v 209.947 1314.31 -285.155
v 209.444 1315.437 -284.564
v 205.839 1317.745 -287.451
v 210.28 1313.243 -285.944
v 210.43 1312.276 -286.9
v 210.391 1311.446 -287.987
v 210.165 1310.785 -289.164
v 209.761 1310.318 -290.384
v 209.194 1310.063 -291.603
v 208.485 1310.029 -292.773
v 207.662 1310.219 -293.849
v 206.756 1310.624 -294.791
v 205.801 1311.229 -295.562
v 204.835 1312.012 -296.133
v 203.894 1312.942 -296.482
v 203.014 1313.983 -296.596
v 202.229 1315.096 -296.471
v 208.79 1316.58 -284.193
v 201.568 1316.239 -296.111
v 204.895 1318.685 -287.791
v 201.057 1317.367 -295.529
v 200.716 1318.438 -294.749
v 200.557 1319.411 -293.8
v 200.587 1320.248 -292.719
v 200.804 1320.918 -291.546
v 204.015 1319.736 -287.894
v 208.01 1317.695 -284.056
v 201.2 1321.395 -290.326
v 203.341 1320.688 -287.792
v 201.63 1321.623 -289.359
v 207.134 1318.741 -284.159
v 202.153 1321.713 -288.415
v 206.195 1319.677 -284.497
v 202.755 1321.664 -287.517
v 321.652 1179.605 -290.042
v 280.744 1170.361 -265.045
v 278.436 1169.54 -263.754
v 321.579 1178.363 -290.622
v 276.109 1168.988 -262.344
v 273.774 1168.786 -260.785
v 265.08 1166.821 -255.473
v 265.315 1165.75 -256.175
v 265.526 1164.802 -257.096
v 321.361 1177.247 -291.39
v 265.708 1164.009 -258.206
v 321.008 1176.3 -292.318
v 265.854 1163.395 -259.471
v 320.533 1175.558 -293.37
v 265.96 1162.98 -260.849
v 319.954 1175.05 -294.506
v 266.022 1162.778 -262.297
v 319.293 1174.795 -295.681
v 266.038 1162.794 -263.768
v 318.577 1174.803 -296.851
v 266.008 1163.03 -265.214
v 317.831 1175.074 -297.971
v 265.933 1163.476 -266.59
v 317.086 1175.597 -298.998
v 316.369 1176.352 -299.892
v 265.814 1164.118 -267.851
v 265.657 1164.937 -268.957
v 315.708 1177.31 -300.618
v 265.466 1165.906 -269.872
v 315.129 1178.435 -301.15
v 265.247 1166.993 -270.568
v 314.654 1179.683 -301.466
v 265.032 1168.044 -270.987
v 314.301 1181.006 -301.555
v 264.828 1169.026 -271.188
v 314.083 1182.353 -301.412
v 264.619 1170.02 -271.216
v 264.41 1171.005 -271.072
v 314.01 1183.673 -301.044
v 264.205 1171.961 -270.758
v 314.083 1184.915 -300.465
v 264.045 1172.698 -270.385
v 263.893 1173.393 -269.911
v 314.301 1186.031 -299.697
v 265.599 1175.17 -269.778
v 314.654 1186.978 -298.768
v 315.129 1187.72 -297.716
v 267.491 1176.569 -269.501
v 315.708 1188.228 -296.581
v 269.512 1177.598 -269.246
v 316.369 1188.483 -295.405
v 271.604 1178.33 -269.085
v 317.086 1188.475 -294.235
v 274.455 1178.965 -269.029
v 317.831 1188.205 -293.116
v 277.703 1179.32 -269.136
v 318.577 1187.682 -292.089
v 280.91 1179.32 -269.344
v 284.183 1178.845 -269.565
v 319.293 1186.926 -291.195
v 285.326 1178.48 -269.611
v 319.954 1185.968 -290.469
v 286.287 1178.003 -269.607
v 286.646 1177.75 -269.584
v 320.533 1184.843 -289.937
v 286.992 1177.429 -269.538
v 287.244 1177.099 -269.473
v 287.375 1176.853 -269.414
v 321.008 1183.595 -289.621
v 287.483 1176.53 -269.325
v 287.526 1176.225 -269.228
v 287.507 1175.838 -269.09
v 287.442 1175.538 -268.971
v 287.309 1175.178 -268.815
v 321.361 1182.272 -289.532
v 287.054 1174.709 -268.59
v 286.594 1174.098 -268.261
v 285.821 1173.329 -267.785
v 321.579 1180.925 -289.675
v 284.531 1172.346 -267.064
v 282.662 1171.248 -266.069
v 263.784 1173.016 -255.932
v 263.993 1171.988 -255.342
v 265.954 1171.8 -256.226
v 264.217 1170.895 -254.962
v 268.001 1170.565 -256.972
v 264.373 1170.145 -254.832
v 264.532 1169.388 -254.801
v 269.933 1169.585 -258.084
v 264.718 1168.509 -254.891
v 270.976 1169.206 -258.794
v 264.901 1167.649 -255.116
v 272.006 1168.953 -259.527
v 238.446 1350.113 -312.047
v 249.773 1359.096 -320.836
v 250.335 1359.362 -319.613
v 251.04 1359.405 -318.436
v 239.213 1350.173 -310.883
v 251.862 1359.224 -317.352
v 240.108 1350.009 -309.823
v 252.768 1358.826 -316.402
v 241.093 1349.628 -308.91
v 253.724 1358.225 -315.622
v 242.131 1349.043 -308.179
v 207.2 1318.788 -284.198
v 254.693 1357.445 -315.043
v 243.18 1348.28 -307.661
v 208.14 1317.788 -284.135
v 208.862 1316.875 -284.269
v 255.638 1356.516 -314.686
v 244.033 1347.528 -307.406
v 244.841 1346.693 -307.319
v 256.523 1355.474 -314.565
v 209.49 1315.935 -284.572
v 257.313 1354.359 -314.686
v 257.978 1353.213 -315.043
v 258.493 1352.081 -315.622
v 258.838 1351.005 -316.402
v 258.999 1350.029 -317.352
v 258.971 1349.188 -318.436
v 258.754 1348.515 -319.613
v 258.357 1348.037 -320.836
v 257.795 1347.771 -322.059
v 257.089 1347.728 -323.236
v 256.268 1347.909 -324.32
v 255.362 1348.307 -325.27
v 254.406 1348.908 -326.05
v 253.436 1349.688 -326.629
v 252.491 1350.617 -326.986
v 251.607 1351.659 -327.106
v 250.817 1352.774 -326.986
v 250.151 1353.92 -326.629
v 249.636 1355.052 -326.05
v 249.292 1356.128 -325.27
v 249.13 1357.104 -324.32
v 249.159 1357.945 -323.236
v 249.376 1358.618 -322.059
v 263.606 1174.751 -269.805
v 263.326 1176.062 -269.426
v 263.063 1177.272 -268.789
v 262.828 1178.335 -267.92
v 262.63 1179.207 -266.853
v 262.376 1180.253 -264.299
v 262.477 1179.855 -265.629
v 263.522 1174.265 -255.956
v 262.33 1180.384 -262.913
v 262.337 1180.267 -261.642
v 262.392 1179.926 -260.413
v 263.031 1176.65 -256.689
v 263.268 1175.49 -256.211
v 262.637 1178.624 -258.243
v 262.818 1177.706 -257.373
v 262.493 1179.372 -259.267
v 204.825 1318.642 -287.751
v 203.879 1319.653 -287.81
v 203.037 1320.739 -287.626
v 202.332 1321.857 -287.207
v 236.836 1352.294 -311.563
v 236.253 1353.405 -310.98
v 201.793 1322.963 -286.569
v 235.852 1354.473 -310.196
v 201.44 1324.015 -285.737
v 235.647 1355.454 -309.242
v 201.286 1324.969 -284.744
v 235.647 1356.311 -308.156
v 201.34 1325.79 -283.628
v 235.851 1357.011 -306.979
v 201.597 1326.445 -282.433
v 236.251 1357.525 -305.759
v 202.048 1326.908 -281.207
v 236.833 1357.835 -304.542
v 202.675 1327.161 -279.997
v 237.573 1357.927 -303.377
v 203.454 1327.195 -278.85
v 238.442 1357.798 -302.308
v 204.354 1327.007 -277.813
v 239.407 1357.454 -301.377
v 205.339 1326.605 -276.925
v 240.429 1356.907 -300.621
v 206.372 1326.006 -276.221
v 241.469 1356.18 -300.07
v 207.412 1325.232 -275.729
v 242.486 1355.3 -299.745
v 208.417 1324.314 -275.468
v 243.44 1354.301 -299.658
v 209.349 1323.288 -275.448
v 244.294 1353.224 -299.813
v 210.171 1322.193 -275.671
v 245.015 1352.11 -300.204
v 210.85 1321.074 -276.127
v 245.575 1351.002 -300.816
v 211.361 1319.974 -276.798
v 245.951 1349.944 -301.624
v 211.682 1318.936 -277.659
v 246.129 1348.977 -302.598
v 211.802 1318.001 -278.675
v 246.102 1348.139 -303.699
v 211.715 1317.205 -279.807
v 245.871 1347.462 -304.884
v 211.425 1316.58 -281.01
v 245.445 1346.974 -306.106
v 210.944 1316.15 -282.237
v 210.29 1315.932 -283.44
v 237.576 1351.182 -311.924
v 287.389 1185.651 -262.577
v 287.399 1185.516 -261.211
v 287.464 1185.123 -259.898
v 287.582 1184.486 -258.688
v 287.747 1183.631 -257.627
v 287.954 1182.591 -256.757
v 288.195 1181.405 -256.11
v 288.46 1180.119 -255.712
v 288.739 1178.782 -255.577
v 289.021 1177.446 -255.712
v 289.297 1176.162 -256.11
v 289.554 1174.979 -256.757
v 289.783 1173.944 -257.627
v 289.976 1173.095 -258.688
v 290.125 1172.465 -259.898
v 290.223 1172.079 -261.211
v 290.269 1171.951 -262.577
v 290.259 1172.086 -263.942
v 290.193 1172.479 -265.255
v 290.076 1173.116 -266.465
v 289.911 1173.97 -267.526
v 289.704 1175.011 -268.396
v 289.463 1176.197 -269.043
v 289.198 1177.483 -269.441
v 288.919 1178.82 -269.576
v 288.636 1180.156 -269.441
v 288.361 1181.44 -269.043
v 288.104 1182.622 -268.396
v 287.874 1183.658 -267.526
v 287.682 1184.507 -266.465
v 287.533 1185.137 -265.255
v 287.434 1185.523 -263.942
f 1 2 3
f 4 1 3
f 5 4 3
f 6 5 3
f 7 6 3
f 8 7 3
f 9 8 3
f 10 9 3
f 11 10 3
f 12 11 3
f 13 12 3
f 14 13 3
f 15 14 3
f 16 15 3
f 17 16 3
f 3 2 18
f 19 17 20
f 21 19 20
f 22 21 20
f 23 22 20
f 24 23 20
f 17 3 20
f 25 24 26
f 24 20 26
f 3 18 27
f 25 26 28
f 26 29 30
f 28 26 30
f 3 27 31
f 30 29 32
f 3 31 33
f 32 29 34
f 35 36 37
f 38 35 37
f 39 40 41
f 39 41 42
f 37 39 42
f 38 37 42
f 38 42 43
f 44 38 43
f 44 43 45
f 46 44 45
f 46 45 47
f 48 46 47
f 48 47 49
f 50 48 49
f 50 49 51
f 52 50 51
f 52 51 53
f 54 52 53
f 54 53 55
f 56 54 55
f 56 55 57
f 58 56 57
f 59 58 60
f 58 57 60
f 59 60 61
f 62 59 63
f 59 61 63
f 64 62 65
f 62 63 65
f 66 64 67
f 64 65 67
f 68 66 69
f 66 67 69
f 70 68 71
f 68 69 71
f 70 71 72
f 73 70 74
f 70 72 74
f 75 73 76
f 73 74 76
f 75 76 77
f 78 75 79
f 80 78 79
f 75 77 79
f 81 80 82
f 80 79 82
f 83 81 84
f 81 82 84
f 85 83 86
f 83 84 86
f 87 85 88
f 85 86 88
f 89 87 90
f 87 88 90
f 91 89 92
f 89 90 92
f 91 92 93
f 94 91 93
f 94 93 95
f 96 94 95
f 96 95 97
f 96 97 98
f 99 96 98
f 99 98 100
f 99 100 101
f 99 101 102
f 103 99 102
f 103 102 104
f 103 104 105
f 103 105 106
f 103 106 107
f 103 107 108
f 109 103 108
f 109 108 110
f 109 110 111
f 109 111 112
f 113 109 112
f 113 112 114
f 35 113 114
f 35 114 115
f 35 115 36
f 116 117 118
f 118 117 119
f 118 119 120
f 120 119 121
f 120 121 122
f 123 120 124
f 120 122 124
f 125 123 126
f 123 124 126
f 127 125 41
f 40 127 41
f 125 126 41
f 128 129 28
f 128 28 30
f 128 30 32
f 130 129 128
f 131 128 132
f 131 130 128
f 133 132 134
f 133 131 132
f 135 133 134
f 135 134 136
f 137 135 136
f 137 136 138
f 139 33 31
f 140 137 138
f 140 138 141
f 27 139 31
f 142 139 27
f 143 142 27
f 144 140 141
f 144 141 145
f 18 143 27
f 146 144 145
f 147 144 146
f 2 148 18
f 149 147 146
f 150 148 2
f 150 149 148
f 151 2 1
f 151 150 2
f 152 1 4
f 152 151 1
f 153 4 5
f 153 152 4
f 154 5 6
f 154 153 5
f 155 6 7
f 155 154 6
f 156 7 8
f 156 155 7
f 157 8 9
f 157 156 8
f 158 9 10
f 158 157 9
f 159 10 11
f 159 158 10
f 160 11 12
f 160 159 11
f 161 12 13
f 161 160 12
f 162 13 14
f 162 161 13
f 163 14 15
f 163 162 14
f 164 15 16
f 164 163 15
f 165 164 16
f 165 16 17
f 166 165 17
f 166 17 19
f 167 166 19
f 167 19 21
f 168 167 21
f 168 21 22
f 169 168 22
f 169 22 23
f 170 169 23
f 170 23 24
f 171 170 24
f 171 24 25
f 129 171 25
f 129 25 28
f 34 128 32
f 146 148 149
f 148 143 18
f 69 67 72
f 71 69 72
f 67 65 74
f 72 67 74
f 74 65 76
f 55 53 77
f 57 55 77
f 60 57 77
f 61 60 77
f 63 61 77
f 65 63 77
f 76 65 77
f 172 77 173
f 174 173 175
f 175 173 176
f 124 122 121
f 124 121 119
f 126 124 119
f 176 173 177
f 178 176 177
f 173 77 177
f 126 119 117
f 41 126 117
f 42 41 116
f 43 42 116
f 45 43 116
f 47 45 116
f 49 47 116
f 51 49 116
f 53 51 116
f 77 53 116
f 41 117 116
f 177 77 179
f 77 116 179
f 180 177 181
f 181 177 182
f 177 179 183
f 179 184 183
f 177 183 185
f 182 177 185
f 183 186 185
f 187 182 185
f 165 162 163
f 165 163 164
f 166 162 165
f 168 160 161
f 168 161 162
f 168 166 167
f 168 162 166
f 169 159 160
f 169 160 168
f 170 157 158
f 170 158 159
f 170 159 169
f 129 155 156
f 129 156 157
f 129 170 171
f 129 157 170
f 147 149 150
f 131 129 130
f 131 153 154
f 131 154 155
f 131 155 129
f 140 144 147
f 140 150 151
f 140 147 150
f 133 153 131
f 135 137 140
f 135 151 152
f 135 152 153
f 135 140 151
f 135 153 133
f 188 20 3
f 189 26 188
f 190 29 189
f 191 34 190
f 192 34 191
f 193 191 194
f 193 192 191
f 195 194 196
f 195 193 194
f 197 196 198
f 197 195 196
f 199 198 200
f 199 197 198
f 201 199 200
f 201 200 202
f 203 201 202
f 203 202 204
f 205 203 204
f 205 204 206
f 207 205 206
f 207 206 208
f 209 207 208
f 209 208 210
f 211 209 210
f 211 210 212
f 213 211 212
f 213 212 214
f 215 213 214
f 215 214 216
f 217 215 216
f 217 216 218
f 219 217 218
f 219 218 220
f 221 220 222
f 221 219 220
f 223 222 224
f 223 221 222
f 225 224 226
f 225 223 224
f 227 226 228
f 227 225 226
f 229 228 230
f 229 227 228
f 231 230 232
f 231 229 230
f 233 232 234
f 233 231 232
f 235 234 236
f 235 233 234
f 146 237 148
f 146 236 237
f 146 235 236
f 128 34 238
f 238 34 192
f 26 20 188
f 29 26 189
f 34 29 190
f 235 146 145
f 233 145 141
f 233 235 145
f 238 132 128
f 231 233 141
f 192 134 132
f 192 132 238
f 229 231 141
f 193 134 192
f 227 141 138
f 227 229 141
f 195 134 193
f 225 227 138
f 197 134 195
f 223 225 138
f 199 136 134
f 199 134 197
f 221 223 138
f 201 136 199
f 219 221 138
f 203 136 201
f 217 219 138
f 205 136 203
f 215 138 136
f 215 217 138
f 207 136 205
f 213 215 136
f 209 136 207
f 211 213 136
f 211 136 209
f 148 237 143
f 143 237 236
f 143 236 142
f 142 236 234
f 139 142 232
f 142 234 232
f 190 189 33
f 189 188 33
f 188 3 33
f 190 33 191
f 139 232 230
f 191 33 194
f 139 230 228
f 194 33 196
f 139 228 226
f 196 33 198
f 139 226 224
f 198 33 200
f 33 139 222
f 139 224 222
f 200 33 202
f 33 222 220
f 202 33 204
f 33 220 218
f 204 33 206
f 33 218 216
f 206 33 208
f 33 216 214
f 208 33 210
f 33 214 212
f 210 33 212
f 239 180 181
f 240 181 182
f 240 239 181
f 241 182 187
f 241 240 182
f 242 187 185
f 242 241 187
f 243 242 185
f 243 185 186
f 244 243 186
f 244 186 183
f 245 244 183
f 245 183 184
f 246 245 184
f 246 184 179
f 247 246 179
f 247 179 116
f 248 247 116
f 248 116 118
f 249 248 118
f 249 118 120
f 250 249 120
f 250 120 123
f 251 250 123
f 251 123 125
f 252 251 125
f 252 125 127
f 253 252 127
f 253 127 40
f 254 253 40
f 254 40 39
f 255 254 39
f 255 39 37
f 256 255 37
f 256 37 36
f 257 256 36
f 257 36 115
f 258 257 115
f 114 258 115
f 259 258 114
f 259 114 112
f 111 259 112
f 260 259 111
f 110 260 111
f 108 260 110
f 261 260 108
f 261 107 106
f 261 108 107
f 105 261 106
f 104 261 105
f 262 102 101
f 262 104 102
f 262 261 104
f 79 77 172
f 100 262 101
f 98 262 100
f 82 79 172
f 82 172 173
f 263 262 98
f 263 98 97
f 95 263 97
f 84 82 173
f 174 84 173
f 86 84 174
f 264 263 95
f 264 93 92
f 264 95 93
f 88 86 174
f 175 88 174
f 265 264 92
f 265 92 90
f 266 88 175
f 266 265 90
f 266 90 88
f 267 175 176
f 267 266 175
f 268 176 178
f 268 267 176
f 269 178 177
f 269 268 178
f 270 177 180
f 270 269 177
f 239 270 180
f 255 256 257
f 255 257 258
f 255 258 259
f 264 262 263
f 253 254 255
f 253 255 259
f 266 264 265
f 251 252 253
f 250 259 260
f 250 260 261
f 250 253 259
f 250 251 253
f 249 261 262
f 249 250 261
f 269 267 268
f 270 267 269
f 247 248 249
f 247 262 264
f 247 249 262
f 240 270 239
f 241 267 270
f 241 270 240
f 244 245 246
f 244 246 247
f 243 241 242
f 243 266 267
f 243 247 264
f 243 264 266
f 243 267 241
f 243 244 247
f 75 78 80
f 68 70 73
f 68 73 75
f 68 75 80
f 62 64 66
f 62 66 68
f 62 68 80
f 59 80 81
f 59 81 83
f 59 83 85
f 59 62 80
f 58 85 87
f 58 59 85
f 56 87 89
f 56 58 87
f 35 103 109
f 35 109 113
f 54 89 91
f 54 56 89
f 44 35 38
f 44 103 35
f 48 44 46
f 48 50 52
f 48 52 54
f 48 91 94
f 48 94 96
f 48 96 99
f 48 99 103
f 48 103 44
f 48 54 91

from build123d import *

# Parameters (mm, degrees)
SUSP_RR_ROCKER_BRACKET_A_PROFILE_R   = 7
SUSP_RR_ROCKER_BRACKET_B_START       = 582.103316114
SUSP_RR_ROCKER_BRACKET_B_OUTLINE_R   = 7
SUSP_RR_ROCKER_BRACKET_B_DEPTH       = 59.237735171
SUSP_RR_ROCKER_BRACKET_B_START_2     = 573.503727818
SUSP_RR_ROCKER_BRACKET_B_2_OUTLINE_R = 7
SUSP_RR_ROCKER_BRACKET_B_2_DEPTH     = 8.599588296
SUSP_RR_ROCKER_BRACKET_B_START_3     = 488
SUSP_RR_ROCKER_BRACKET_B_3_OUTLINE_W = 17
SUSP_RR_ROCKER_BRACKET_B_3_OUTLINE_H = 18
SUSP_RR_ROCKER_BRACKET_B_3_DEPTH     = 8.001614425
SUSP_RR_COILOVER_BRACKET_A_PROFILE_R = 7
SUSP_RR_COILOVER_BRACKET_B_PROFILE_R = 7


with BuildPart() as part:
    # SUSP_RR_rocker_bracket_a: sweep along a curve in space
    with BuildLine() as susp_rr_rocker_bracket_a_path:
        Line((263.769266, 1173.5341, -262.913084), (288.828884, 1178.80091, -262.576559))
    # SUSP_RR_rocker_bracket_a profile (on start of the path) → SUSP_RR_rocker_bracket_a (sweep)
    with BuildSketch(Plane(origin=(263.769266, 1173.5341, -262.913084), x_dir=(-0.20567769530184105, 0.9786197860534618, 0), z_dir=(0.9785352890118953, 0.2056599364571734, 0.013140726571920548))):
        Circle(SUSP_RR_ROCKER_BRACKET_A_PROFILE_R)
    sweep(path=susp_rr_rocker_bracket_a_path.line)

    # SUSP_RR_rocker_bracket_b: read off the stored shape, not the designer's step
    # SUSP_RR_rocker_bracket_b outline → SUSP_RR_rocker_bracket_b (add)
    with BuildSketch(Plane(origin=(0, 0, 0), x_dir=(0.5458835432361197, -0.29060444522986084, 0.7858499943606441), z_dir=(0.837861060811385, 0.189334713906647, -0.51199727429539)).offset(SUSP_RR_ROCKER_BRACKET_B_START)):
        with Locations((-402.143607902, -1005.781118034)):
            Circle(SUSP_RR_ROCKER_BRACKET_B_OUTLINE_R)
    extrude(amount=SUSP_RR_ROCKER_BRACKET_B_DEPTH)

    # SUSP_RR_rocker_bracket_b 2 outline → SUSP_RR_rocker_bracket_b 2 (add)
    with BuildSketch(Plane(origin=(0, 0, 0), x_dir=(0.5458835432361197, -0.29060444522986084, 0.7858499943606441), z_dir=(0.837861060811385, 0.189334713906647, -0.51199727429539)).offset(SUSP_RR_ROCKER_BRACKET_B_START_2)):
        with Locations((-402.143607902, -1005.781118034)):
            Circle(SUSP_RR_ROCKER_BRACKET_B_2_OUTLINE_R)
    extrude(amount=SUSP_RR_ROCKER_BRACKET_B_2_DEPTH)

    # SUSP_RR_rocker_bracket_b 3 outline → SUSP_RR_rocker_bracket_b 3 (cut)
    with BuildSketch(Plane(origin=(0, 0, 0), x_dir=(-0.20564139487715902, 0.9786235182829146, -0.0027615532850912184), z_dir=(0.9785352890118946, 0.2056599364571769, 0.013140726571917593)).offset(SUSP_RR_ROCKER_BRACKET_B_START_3)):
        with Locations((1090.5, -266)):
            Rectangle(SUSP_RR_ROCKER_BRACKET_B_3_OUTLINE_W, SUSP_RR_ROCKER_BRACKET_B_3_OUTLINE_H)
    extrude(amount=SUSP_RR_ROCKER_BRACKET_B_3_DEPTH, mode=Mode.SUBTRACT)


with BuildPart() as body_2:
    # SUSP_RR_coilover_bracket_a: sweep along a curve in space
    with BuildLine() as susp_rr_coilover_bracket_a_path:
        Line((206.541275, 1321.55687, -281.622316), (240.881884, 1352.27636, -305.851027))
    # SUSP_RR_coilover_bracket_a profile (on start of the path) → SUSP_RR_coilover_bracket_a (sweep)
    with BuildSketch(Plane(origin=(206.541275, 1321.55687, -281.622316), x_dir=(-0.6667186997086567, 0.7453094494629717, 0), z_dir=(0.6596654729611602, 0.5901056355749471, -0.46542110249280333))):
        Circle(SUSP_RR_COILOVER_BRACKET_A_PROFILE_R)
    sweep(path=susp_rr_coilover_bracket_a_path.line)

    # SUSP_RR_coilover_bracket_b: sweep along a curve in space
    with BuildLine() as susp_rr_coilover_bracket_b_path:
        Line((205.492137, 1315.8651, -290.325886), (254.064716, 1353.56644, -320.835973))
    # SUSP_RR_coilover_bracket_b profile (on start of the path) → SUSP_RR_coilover_bracket_b (sweep)
    with BuildSketch(Plane(origin=(205.492137, 1315.8651, -290.325886), x_dir=(-0.6131566671765795, 0.7899613291148557, 0), z_dir=(0.7076347872393257, 0.5492559847303456, -0.44448944996102296))):
        Circle(SUSP_RR_COILOVER_BRACKET_B_PROFILE_R)
    sweep(path=susp_rr_coilover_bracket_b_path.line)


solid = Compound([part.part, body_2.part])
